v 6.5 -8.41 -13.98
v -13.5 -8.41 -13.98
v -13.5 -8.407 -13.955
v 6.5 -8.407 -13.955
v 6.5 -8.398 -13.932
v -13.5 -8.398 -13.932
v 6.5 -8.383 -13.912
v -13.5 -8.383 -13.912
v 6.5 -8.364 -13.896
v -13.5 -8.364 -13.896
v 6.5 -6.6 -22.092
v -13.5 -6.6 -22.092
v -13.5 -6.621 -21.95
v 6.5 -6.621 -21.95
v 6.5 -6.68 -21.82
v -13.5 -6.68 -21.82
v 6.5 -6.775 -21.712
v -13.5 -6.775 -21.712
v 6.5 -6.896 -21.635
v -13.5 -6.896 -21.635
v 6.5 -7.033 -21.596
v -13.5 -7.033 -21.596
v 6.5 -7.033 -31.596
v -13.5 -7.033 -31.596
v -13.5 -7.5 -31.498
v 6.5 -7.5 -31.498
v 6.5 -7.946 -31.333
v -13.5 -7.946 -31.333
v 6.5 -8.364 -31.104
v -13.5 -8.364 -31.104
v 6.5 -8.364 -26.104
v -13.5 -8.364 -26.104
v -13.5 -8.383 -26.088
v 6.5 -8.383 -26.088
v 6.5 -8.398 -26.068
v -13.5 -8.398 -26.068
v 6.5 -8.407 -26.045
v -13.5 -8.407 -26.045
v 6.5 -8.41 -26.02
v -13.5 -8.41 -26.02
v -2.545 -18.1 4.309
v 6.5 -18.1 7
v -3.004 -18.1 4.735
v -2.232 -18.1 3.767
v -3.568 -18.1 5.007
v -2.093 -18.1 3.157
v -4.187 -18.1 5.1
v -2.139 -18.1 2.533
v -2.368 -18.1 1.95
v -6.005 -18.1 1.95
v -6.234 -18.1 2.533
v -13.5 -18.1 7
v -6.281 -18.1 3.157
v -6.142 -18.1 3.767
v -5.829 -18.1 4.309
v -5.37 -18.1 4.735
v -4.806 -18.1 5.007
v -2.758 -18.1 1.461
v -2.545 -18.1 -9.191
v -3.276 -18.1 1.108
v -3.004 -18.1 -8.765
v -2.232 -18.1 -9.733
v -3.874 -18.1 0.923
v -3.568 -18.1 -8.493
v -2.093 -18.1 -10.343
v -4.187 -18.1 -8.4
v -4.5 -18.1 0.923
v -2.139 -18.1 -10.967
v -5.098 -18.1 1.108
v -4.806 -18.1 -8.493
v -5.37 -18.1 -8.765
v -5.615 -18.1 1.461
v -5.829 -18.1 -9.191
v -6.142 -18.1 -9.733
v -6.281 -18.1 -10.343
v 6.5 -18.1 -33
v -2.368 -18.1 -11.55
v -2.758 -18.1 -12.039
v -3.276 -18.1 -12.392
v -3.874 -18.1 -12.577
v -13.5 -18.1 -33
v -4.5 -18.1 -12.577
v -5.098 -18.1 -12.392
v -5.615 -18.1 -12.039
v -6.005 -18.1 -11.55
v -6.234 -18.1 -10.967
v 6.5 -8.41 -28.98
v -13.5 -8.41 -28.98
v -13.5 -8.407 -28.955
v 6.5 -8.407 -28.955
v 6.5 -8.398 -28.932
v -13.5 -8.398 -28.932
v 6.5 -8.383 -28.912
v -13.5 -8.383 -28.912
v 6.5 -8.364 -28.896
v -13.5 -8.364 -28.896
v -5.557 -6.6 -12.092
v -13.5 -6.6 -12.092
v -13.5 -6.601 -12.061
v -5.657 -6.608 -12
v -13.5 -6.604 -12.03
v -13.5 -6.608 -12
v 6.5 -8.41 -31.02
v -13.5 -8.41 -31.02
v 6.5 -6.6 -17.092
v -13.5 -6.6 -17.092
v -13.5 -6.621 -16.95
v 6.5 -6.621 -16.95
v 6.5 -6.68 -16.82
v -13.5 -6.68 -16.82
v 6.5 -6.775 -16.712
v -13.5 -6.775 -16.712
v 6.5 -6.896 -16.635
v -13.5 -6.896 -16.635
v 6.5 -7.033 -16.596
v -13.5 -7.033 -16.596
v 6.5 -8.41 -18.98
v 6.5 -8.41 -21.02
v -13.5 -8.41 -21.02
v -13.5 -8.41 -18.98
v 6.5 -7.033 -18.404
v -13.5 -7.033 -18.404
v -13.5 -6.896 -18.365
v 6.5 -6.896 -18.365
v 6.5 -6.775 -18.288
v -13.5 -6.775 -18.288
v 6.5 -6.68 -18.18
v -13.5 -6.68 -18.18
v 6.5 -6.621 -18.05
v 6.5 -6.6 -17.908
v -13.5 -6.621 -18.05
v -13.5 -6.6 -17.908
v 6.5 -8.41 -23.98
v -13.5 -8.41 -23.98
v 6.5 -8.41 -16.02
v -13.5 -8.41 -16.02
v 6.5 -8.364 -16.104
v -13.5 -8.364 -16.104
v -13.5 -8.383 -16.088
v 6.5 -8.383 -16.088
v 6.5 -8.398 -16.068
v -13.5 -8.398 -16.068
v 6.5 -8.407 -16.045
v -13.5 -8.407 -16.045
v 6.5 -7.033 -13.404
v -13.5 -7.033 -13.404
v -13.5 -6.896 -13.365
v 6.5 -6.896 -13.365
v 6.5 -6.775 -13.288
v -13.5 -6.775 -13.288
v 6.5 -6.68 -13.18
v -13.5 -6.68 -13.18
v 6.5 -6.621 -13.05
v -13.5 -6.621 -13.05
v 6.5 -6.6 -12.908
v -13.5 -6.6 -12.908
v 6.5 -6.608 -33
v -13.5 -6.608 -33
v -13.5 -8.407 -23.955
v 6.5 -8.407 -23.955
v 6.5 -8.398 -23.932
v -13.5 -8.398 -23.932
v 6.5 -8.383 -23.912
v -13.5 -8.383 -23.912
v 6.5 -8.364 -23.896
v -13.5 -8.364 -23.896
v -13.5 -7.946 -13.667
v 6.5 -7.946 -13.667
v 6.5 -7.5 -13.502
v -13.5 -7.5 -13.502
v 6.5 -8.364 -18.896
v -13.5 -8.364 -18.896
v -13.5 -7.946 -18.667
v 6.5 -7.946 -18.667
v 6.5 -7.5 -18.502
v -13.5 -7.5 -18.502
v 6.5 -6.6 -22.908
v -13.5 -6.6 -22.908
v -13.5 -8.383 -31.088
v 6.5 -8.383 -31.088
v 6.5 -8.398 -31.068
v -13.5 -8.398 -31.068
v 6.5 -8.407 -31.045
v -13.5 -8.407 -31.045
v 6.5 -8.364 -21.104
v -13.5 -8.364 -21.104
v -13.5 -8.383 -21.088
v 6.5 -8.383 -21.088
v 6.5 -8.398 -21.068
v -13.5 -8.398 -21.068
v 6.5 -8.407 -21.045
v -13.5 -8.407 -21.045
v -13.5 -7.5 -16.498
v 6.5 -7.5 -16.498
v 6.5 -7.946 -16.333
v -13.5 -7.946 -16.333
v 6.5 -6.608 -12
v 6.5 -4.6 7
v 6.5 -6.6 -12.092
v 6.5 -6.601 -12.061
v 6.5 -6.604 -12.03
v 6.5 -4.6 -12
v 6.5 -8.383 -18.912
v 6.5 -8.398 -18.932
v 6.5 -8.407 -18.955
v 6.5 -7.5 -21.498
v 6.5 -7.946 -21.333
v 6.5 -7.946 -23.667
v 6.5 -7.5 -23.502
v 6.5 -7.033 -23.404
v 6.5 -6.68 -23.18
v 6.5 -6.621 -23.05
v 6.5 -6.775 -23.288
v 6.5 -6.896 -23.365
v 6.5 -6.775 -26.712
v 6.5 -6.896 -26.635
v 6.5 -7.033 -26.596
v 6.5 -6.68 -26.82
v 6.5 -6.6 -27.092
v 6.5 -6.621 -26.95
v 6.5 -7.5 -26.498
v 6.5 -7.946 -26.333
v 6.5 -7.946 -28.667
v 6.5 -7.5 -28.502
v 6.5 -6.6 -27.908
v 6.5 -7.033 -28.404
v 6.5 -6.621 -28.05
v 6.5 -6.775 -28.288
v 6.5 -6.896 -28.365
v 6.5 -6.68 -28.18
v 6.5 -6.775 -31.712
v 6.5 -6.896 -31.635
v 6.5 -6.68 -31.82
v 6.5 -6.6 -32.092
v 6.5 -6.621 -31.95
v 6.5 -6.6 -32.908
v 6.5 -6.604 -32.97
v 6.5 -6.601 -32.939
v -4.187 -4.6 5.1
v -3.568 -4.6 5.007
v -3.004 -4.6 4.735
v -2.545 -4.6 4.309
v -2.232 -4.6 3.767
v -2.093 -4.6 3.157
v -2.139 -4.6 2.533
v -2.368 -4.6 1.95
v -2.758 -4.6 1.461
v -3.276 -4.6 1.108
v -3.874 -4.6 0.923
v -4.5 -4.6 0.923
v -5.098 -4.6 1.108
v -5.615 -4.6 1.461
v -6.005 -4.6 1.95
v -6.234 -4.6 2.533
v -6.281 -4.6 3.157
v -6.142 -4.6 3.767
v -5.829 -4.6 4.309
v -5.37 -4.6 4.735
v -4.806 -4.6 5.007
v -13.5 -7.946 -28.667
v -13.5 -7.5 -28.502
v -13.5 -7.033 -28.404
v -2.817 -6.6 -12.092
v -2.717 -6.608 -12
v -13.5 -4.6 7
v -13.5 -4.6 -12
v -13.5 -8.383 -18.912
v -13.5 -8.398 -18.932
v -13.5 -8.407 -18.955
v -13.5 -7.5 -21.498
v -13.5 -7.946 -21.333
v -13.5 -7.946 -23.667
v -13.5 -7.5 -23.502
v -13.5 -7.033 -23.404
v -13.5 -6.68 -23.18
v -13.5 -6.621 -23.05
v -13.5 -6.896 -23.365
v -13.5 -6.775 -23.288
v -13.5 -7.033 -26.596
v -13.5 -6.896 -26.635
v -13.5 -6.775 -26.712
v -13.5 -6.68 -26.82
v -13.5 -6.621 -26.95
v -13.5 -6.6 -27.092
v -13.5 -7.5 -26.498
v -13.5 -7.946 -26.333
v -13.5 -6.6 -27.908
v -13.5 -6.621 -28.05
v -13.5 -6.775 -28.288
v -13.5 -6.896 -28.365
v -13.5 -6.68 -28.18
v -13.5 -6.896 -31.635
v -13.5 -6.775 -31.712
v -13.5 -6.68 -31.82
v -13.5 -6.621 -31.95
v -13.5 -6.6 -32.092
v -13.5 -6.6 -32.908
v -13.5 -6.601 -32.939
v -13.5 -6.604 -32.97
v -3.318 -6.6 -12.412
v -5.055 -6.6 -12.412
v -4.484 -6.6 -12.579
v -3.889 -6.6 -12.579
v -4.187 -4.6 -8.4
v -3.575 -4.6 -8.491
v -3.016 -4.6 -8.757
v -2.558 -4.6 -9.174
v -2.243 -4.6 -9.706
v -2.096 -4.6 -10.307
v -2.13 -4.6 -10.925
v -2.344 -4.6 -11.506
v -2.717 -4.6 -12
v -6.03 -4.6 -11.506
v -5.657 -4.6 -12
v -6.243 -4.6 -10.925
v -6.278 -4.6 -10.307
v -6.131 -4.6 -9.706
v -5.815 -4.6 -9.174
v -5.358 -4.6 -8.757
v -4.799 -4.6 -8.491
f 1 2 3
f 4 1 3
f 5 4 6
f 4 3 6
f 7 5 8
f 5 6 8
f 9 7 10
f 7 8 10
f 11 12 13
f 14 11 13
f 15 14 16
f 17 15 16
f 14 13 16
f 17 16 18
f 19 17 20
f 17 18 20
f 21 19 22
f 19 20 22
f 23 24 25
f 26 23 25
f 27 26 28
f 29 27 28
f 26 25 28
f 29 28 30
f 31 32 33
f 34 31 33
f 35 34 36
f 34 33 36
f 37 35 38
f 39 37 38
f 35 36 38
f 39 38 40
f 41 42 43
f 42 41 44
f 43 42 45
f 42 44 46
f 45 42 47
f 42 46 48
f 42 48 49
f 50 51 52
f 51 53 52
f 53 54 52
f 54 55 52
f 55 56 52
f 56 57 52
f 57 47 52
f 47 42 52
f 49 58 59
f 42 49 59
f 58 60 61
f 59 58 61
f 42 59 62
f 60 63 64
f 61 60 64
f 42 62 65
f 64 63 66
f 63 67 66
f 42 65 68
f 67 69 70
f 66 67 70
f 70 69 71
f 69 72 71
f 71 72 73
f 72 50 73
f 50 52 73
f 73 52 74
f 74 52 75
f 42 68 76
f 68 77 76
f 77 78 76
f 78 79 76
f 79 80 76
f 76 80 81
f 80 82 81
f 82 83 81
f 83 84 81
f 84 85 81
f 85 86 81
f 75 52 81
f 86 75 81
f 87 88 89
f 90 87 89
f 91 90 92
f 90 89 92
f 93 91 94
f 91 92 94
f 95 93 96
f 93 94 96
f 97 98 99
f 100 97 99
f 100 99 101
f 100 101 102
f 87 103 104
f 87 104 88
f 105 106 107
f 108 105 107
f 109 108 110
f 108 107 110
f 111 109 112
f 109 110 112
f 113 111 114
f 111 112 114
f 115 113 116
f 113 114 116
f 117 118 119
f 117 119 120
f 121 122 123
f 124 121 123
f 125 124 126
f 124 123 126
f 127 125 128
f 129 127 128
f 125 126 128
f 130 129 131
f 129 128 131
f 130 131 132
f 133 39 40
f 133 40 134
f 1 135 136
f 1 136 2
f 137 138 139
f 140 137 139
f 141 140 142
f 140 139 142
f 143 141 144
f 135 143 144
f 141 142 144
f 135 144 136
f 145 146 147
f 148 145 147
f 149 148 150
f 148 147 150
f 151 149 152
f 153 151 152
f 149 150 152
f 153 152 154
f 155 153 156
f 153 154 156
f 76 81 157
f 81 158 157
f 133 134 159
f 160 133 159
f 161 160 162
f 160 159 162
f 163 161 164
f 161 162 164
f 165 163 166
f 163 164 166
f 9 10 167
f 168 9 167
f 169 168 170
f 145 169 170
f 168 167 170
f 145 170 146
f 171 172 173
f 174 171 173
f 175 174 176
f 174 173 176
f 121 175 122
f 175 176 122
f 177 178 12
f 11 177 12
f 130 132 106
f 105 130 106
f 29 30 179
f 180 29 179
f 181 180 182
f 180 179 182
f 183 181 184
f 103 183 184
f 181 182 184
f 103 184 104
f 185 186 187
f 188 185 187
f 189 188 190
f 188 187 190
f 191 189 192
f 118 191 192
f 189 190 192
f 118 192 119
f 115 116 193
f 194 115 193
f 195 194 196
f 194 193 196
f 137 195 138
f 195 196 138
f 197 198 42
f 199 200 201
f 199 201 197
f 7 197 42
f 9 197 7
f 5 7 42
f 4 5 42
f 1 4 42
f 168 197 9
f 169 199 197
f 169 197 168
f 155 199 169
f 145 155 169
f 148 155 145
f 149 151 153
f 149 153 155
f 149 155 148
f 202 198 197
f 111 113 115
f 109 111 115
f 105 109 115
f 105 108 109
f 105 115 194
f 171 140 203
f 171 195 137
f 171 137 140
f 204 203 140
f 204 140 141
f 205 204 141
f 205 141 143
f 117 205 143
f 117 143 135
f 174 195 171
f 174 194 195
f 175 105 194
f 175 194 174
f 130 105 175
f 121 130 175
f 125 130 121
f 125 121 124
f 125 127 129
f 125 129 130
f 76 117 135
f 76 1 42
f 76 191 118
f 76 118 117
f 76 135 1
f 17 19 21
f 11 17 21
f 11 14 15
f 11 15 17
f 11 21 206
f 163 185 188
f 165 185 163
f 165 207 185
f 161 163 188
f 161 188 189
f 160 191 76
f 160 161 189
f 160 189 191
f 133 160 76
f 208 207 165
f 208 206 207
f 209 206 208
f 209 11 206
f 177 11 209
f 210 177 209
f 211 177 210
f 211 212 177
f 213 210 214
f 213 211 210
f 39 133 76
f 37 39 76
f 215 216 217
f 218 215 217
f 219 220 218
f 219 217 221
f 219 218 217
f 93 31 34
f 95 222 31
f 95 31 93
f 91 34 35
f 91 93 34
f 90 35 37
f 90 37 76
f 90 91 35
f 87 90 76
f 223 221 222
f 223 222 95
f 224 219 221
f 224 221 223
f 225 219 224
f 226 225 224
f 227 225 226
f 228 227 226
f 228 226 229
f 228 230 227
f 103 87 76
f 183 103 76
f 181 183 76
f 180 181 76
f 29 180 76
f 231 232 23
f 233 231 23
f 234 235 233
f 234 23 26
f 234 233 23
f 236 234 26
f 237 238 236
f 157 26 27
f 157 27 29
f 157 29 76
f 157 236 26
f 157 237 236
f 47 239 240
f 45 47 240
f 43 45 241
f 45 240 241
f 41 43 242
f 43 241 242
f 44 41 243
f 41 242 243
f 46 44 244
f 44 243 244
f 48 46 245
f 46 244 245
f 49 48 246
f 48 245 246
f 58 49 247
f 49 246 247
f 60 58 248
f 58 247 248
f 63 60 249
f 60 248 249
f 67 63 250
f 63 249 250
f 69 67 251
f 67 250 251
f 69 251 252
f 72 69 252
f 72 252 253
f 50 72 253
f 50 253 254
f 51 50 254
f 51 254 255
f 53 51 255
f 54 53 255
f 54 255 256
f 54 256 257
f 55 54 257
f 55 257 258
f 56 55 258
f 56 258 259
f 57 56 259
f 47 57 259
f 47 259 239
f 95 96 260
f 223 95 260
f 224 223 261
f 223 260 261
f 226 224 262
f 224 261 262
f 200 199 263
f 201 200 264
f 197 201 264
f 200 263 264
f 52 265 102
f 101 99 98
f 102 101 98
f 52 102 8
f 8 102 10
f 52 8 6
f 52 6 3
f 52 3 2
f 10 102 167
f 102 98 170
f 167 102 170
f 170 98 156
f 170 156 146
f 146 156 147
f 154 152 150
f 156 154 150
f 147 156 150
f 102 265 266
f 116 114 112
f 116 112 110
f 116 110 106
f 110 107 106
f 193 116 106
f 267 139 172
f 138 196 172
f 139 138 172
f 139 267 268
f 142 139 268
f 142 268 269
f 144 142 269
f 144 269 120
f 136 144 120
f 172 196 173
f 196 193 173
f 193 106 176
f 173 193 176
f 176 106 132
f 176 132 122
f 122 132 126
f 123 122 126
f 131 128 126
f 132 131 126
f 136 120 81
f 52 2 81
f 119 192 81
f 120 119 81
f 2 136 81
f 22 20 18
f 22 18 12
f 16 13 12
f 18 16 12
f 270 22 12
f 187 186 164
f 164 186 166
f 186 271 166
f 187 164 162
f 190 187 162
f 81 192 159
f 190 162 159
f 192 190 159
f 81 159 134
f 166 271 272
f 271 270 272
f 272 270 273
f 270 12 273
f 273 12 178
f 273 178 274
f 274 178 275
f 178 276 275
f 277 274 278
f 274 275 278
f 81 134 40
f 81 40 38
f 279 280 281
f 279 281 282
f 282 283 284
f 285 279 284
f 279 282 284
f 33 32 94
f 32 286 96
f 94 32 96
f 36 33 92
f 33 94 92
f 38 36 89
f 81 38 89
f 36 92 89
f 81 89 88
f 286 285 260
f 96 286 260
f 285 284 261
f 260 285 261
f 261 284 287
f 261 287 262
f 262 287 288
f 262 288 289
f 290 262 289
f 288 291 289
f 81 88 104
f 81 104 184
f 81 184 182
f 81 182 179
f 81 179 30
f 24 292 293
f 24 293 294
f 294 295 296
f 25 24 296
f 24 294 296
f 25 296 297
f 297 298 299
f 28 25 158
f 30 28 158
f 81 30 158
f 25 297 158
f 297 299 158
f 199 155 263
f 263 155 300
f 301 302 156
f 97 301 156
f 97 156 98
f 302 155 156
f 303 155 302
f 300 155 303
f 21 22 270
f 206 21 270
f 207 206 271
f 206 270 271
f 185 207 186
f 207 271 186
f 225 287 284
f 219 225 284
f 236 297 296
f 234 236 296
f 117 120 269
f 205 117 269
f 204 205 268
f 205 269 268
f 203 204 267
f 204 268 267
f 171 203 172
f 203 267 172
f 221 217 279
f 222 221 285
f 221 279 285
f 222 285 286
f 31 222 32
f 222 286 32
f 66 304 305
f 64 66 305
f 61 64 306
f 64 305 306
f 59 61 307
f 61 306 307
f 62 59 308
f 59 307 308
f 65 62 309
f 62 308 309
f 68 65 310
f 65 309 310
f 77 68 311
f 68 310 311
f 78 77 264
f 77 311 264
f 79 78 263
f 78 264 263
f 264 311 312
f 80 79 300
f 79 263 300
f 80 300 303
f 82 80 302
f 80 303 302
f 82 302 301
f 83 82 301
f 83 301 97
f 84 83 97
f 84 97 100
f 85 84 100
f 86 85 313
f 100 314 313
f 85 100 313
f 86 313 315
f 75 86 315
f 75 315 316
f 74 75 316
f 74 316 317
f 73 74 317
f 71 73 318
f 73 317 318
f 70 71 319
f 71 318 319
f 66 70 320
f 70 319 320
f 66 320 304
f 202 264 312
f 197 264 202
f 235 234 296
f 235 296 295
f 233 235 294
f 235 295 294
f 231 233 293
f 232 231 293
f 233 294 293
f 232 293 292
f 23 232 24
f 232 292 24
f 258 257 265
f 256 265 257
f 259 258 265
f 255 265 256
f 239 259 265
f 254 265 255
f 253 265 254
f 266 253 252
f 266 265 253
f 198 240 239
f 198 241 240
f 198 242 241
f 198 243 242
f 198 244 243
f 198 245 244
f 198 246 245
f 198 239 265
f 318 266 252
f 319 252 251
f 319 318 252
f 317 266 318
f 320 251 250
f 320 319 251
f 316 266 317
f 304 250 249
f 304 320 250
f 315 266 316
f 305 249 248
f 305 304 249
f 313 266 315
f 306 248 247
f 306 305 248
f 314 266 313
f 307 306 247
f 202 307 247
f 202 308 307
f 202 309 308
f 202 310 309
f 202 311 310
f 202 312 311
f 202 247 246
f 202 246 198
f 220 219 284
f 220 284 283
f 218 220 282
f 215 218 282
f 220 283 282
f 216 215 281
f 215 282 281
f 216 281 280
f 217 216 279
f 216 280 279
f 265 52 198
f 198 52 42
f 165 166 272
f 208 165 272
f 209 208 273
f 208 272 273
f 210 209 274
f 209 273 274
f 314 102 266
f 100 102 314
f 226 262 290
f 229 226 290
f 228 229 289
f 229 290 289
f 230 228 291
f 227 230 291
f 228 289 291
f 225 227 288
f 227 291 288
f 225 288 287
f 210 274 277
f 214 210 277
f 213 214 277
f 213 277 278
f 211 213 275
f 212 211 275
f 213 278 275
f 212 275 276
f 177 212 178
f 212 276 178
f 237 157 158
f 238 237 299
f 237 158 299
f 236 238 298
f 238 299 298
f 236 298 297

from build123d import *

# Parameters (mm, degrees)
DELETE_START           = -13.5
DELETE_FACE_1_DEPTH    = 27
MOVE_FACE_1_BY         = 7
MOVE_FACE_2_BY         = 5.5
SKETCH_2_W             = 48.263019836
SKETCH_2_H             = 43.058184364
CUT_EXTRUDE_1_DEPTH    = 20
EXTRUDE_1_DEPTH        = 2
EXTRUDE_1_DEPTH_BACK   = 5
SKETCH_3_W             = 20
SKETCH_3_H             = 19
HOLE_WIZARD_M5_1_D     = 4.2
HOLE_WIZARD_M5_1_DEPTH = 20
HOLE_WIZARD_M5_1_TIP   = 1.2618073


with BuildPart() as part:
    # Delete Face 1: read off the stored shape, not the designer's step
    # Delete Face 1 outline → Delete Face 1 (new body)
    with BuildSketch(Plane.YZ.offset(DELETE_START)):
        with BuildLine():
            ThreePointArc((-8.364285714, 23.895568572), (-8.397831007, 23.931741933), (-8.41, 23.979551078))
            Line((-8.41, 23.979551078), (-8.41, 26.020448922))
            ThreePointArc((-8.41, 26.020448922), (-8.397831007, 26.068258067), (-8.364285714, 26.104431428))
            ThreePointArc((-8.364285714, 26.104431428), (-7.725958169, 26.423724028), (-7.033327746, 26.595982314))
            ThreePointArc((-7.033327746, 26.595982314), (-6.723611818, 26.762379014), (-6.6, 27.091517187))
            Line((-6.6, 27.091517187), (-6.6, 27.908482813))
            ThreePointArc((-6.6, 27.908482813), (-6.723615527, 28.237625227), (-7.033338915, 28.404019189))
            ThreePointArc((-7.033338915, 28.404019189), (-7.725963455, 28.576277924), (-8.364285714, 28.895568572))
            ThreePointArc((-8.364285714, 28.895568572), (-8.397831007, 28.931741933), (-8.41, 28.979551078))
            Line((-8.41, 28.979551078), (-8.41, 31.020448922))
            ThreePointArc((-8.41, 31.020448922), (-8.397831007, 31.068258067), (-8.364285714, 31.104431428))
            ThreePointArc((-8.364285714, 31.104431428), (-7.725958168, 31.423724029), (-7.033327744, 31.595982314))
            ThreePointArc((-7.033327744, 31.595982314), (-6.723611817, 31.762379015), (-6.6, 32.091517187))
            Line((-6.6, 32.091517187), (-6.6, 32.908482813))
            ThreePointArc((-6.6, 32.908482813), (-6.602116164, 32.954435895), (-6.608446743, 33))
            Line((-6.608446743, 33), (-12.6, 33))
            Line((-12.6, 33), (-12.6, -33))
            Line((-12.6, -33), (-6.608446743, -33))
            ThreePointArc((-6.608446743, -33), (-6.602116164, -32.954435895), (-6.6, -32.908482813))
            Line((-6.6, -32.908482813), (-6.6, -32.091517187))
            ThreePointArc((-6.6, -32.091517187), (-6.723615531, -31.762374768), (-7.033338927, -31.595980809))
            ThreePointArc((-7.033338927, -31.595980809), (-7.72596346, -31.423722074), (-8.364285714, -31.104431428))
            ThreePointArc((-8.364285714, -31.104431428), (-8.397831007, -31.068258067), (-8.41, -31.020448922))
            Line((-8.41, -31.020448922), (-8.41, -28.979551078))
            ThreePointArc((-8.41, -28.979551078), (-8.397831007, -28.931741933), (-8.364285714, -28.895568572))
            ThreePointArc((-8.364285714, -28.895568572), (-7.725958168, -28.576275971), (-7.033327744, -28.404017686))
            ThreePointArc((-7.033327744, -28.404017686), (-6.723611817, -28.237620985), (-6.6, -27.908482813))
            Line((-6.6, -27.908482813), (-6.6, -27.091517187))
            ThreePointArc((-6.6, -27.091517187), (-6.723615528, -26.762374772), (-7.033338917, -26.595980811))
            ThreePointArc((-7.033338917, -26.595980811), (-7.725963456, -26.423722076), (-8.364285714, -26.104431428))
            ThreePointArc((-8.364285714, -26.104431428), (-8.397831007, -26.068258067), (-8.41, -26.020448922))
            Line((-8.41, -26.020448922), (-8.41, -23.979551078))
            ThreePointArc((-8.41, -23.979551078), (-8.397831007, -23.931741933), (-8.364285714, -23.895568572))
            ThreePointArc((-8.364285714, -23.895568572), (-7.725958169, -23.576275972), (-7.033327746, -23.404017686))
            ThreePointArc((-7.033327746, -23.404017686), (-6.723611818, -23.237620986), (-6.6, -22.908482813))
            Line((-6.6, -22.908482813), (-6.6, -22.091517187))
            ThreePointArc((-6.6, -22.091517187), (-6.723615529, -21.76237477), (-7.033338921, -21.59598081))
            ThreePointArc((-7.033338921, -21.59598081), (-7.725963458, -21.423722075), (-8.364285714, -21.104431428))
            ThreePointArc((-8.364285714, -21.104431428), (-8.397831007, -21.068258067), (-8.41, -21.020448922))
            Line((-8.41, -21.020448922), (-8.41, -18.979551078))
            ThreePointArc((-8.41, -18.979551078), (-8.397831007, -18.931741933), (-8.364285714, -18.895568572))
            ThreePointArc((-8.364285714, -18.895568572), (-7.725958168, -18.576275971), (-7.033327744, -18.404017686))
            ThreePointArc((-7.033327744, -18.404017686), (-6.723611817, -18.237620985), (-6.6, -17.908482813))
            Line((-6.6, -17.908482813), (-6.6, -17.091517187))
            ThreePointArc((-6.6, -17.091517187), (-6.723615531, -16.762374768), (-7.033338926, -16.595980809))
            ThreePointArc((-7.033338926, -16.595980809), (-7.72596346, -16.423722074), (-8.364285714, -16.104431428))
            ThreePointArc((-8.364285714, -16.104431428), (-8.397831007, -16.068258067), (-8.41, -16.020448922))
            Line((-8.41, -16.020448922), (-8.41, -13.979551078))
            ThreePointArc((-8.41, -13.979551078), (-8.397831007, -13.931741933), (-8.364285714, -13.895568572))
            ThreePointArc((-8.364285714, -13.895568572), (-7.725958337, -13.576276034), (-7.033328102, -13.404017734))
            ThreePointArc((-7.033328102, -13.404017734), (-6.723611936, -13.237621121), (-6.6, -12.908482813))
            Line((-6.6, -12.908482813), (-6.6, -12.091517187))
            ThreePointArc((-6.6, -12.091517187), (-6.723615532, -11.762374767), (-7.033338929, -11.595980809))
            ThreePointArc((-7.033338929, -11.595980809), (-7.725963462, -11.423722074), (-8.364285714, -11.104431428))
            ThreePointArc((-8.364285714, -11.104431428), (-8.397831007, -11.068258067), (-8.41, -11.020448922))
            Line((-8.41, -11.020448922), (-8.41, -8.979551078))
            ThreePointArc((-8.41, -8.979551078), (-8.397831007, -8.931741933), (-8.364285714, -8.895568572))
            ThreePointArc((-8.364285714, -8.895568572), (-7.725958524, -8.576276103), (-7.033328496, -8.404017787))
            ThreePointArc((-7.033328496, -8.404017787), (-6.723612067, -8.23762127), (-6.6, -7.908482813))
            Line((-6.6, -7.908482813), (-6.6, -7.091517187))
            ThreePointArc((-6.6, -7.091517187), (-6.723615306, -6.762375026), (-7.033338249, -6.595980901))
            ThreePointArc((-7.033338249, -6.595980901), (-7.72596314, -6.423722193), (-8.364285714, -6.104431428))
            ThreePointArc((-8.364285714, -6.104431428), (-8.397831007, -6.068258067), (-8.41, -6.020448922))
            Line((-8.41, -6.020448922), (-8.41, -3.979551078))
            ThreePointArc((-8.41, -3.979551078), (-8.397831007, -3.931741933), (-8.364285714, -3.895568572))
            ThreePointArc((-8.364285714, -3.895568572), (-7.725958462, -3.57627608), (-7.033328366, -3.40401777))
            ThreePointArc((-7.033328366, -3.40401777), (-6.723612024, -3.237621221), (-6.6, -2.908482813))
            Line((-6.6, -2.908482813), (-6.6, -2.091517187))
            ThreePointArc((-6.6, -2.091517187), (-6.723615307, -1.762375024), (-7.033338252, -1.5959809))
            ThreePointArc((-7.033338252, -1.5959809), (-7.725963141, -1.423722192), (-8.364285714, -1.104431428))
            ThreePointArc((-8.364285714, -1.104431428), (-8.397831007, -1.068258067), (-8.41, -1.020448922))
            Line((-8.41, -1.020448922), (-8.41, 1.020448922))
            ThreePointArc((-8.41, 1.020448922), (-8.397831007, 1.068258067), (-8.364285714, 1.104431428))
            ThreePointArc((-8.364285714, 1.104431428), (-7.725958462, 1.42372392), (-7.033328366, 1.59598223))
            ThreePointArc((-7.033328366, 1.59598223), (-6.723612024, 1.762378779), (-6.6, 2.091517187))
            Line((-6.6, 2.091517187), (-6.6, 2.908482813))
            ThreePointArc((-6.6, 2.908482813), (-6.723615307, 3.237624975), (-7.033338252, 3.4040191))
            ThreePointArc((-7.033338252, 3.4040191), (-7.725963141, 3.576277808), (-8.364285714, 3.895568572))
            ThreePointArc((-8.364285714, 3.895568572), (-8.397831007, 3.931741933), (-8.41, 3.979551078))
            Line((-8.41, 3.979551078), (-8.41, 6.020448922))
            ThreePointArc((-8.41, 6.020448922), (-8.397831007, 6.068258067), (-8.364285714, 6.104431428))
            ThreePointArc((-8.364285714, 6.104431428), (-7.725958469, 6.423723918), (-7.03332838, 6.595982228))
            ThreePointArc((-7.03332838, 6.595982228), (-6.723612029, 6.762378774), (-6.6, 7.091517187))
            Line((-6.6, 7.091517187), (-6.6, 7.908482813))
            ThreePointArc((-6.6, 7.908482813), (-6.723615311, 8.23762498), (-7.033338263, 8.404019101))
            ThreePointArc((-7.033338263, 8.404019101), (-7.725963146, 8.57627781), (-8.364285714, 8.895568572))
            ThreePointArc((-8.364285714, 8.895568572), (-8.397831007, 8.931741933), (-8.41, 8.979551078))
            Line((-8.41, 8.979551078), (-8.41, 11.020448922))
            ThreePointArc((-8.41, 11.020448922), (-8.397831007, 11.068258067), (-8.364285714, 11.104431428))
            ThreePointArc((-8.364285714, 11.104431428), (-7.725958337, 11.423723966), (-7.033328101, 11.595982266))
            ThreePointArc((-7.033328101, 11.595982266), (-6.723611936, 11.76237888), (-6.6, 12.091517187))
            Line((-6.6, 12.091517187), (-6.6, 12.908482813))
            ThreePointArc((-6.6, 12.908482813), (-6.72361553, 13.237625231), (-7.033338924, 13.40401919))
            ThreePointArc((-7.033338924, 13.40401919), (-7.725963459, 13.576277925), (-8.364285714, 13.895568572))
            ThreePointArc((-8.364285714, 13.895568572), (-8.397831007, 13.931741933), (-8.41, 13.979551078))
            Line((-8.41, 13.979551078), (-8.41, 16.020448922))
            ThreePointArc((-8.41, 16.020448922), (-8.397831007, 16.068258067), (-8.364285714, 16.104431428))
            ThreePointArc((-8.364285714, 16.104431428), (-7.725958169, 16.423724029), (-7.033327745, 16.595982314))
            ThreePointArc((-7.033327745, 16.595982314), (-6.723611818, 16.762379015), (-6.6, 17.091517187))
            Line((-6.6, 17.091517187), (-6.6, 17.908482813))
            ThreePointArc((-6.6, 17.908482813), (-6.72361553, 18.23762523), (-7.033338923, 18.40401919))
            ThreePointArc((-7.033338923, 18.40401919), (-7.725963459, 18.576277925), (-8.364285714, 18.895568572))
            ThreePointArc((-8.364285714, 18.895568572), (-8.397831007, 18.931741933), (-8.41, 18.979551078))
            Line((-8.41, 18.979551078), (-8.41, 21.020448922))
            ThreePointArc((-8.41, 21.020448922), (-8.397831007, 21.068258067), (-8.364285714, 21.104431428))
            ThreePointArc((-8.364285714, 21.104431428), (-7.725958168, 21.423724029), (-7.033327744, 21.595982314))
            ThreePointArc((-7.033327744, 21.595982314), (-6.723611817, 21.762379015), (-6.6, 22.091517187))
            Line((-6.6, 22.091517187), (-6.6, 22.908482813))
            ThreePointArc((-6.6, 22.908482813), (-6.723615528, 23.237625227), (-7.033338915, 23.404019189))
            ThreePointArc((-7.033338915, 23.404019189), (-7.725963455, 23.576277924), (-8.364285714, 23.895568572))
        make_face()
    extrude(amount=DELETE_FACE_1_DEPTH)

    # Move Face 1: a face moved inward by 7.0
    extrude(part.faces().sort_by_distance((13.5, -10.05864991, 0))[0], amount=MOVE_FACE_1_BY, dir=(-1, 0, 0), mode=Mode.SUBTRACT)

    # Move Face 2: a face moved outward by 5.5
    extrude(part.faces().sort_by_distance((-3.5, -12.6, 0))[0], amount=MOVE_FACE_2_BY, dir=(0, -1, 0))

    # 草图2 → 切除-拉伸1 (cut)
    with BuildSketch(Plane.XZ.offset(18.1)):
        with Locations((-0.503276546, 28.529092182)):
            Rectangle(SKETCH_2_W, SKETCH_2_H)
    extrude(amount=-CUT_EXTRUDE_1_DEPTH, mode=Mode.SUBTRACT)

    # 草图3 → 凸台-拉伸1 (add, two sides: drawn at the far end of the back side and taken through both)
    with BuildSketch(Plane(origin=(0, -6.6, 0), x_dir=(1, 0, 0), z_dir=(0, 1, 0)).offset(-EXTRUDE_1_DEPTH_BACK)):
        with Locations((-3.5, 2.5)):
            Rectangle(SKETCH_3_W, SKETCH_3_H)
    extrude(amount=EXTRUDE_1_DEPTH + EXTRUDE_1_DEPTH_BACK)

    # M5 螺纹孔1
    with Locations(Plane(origin=(-4.186814404, -18.1, 3), x_dir=(0, 0, -1), z_dir=(0, -1, 0))):
        with Locations((0, 0), (13.5, 0)):
            Hole(HOLE_WIZARD_M5_1_D / 2, depth=HOLE_WIZARD_M5_1_DEPTH)
            with Locations((0, 0, -(HOLE_WIZARD_M5_1_DEPTH + HOLE_WIZARD_M5_1_TIP / 2))):  # 118° drill point
                Cone(0, HOLE_WIZARD_M5_1_D / 2, HOLE_WIZARD_M5_1_TIP, mode=Mode.SUBTRACT)


solid = part.part
